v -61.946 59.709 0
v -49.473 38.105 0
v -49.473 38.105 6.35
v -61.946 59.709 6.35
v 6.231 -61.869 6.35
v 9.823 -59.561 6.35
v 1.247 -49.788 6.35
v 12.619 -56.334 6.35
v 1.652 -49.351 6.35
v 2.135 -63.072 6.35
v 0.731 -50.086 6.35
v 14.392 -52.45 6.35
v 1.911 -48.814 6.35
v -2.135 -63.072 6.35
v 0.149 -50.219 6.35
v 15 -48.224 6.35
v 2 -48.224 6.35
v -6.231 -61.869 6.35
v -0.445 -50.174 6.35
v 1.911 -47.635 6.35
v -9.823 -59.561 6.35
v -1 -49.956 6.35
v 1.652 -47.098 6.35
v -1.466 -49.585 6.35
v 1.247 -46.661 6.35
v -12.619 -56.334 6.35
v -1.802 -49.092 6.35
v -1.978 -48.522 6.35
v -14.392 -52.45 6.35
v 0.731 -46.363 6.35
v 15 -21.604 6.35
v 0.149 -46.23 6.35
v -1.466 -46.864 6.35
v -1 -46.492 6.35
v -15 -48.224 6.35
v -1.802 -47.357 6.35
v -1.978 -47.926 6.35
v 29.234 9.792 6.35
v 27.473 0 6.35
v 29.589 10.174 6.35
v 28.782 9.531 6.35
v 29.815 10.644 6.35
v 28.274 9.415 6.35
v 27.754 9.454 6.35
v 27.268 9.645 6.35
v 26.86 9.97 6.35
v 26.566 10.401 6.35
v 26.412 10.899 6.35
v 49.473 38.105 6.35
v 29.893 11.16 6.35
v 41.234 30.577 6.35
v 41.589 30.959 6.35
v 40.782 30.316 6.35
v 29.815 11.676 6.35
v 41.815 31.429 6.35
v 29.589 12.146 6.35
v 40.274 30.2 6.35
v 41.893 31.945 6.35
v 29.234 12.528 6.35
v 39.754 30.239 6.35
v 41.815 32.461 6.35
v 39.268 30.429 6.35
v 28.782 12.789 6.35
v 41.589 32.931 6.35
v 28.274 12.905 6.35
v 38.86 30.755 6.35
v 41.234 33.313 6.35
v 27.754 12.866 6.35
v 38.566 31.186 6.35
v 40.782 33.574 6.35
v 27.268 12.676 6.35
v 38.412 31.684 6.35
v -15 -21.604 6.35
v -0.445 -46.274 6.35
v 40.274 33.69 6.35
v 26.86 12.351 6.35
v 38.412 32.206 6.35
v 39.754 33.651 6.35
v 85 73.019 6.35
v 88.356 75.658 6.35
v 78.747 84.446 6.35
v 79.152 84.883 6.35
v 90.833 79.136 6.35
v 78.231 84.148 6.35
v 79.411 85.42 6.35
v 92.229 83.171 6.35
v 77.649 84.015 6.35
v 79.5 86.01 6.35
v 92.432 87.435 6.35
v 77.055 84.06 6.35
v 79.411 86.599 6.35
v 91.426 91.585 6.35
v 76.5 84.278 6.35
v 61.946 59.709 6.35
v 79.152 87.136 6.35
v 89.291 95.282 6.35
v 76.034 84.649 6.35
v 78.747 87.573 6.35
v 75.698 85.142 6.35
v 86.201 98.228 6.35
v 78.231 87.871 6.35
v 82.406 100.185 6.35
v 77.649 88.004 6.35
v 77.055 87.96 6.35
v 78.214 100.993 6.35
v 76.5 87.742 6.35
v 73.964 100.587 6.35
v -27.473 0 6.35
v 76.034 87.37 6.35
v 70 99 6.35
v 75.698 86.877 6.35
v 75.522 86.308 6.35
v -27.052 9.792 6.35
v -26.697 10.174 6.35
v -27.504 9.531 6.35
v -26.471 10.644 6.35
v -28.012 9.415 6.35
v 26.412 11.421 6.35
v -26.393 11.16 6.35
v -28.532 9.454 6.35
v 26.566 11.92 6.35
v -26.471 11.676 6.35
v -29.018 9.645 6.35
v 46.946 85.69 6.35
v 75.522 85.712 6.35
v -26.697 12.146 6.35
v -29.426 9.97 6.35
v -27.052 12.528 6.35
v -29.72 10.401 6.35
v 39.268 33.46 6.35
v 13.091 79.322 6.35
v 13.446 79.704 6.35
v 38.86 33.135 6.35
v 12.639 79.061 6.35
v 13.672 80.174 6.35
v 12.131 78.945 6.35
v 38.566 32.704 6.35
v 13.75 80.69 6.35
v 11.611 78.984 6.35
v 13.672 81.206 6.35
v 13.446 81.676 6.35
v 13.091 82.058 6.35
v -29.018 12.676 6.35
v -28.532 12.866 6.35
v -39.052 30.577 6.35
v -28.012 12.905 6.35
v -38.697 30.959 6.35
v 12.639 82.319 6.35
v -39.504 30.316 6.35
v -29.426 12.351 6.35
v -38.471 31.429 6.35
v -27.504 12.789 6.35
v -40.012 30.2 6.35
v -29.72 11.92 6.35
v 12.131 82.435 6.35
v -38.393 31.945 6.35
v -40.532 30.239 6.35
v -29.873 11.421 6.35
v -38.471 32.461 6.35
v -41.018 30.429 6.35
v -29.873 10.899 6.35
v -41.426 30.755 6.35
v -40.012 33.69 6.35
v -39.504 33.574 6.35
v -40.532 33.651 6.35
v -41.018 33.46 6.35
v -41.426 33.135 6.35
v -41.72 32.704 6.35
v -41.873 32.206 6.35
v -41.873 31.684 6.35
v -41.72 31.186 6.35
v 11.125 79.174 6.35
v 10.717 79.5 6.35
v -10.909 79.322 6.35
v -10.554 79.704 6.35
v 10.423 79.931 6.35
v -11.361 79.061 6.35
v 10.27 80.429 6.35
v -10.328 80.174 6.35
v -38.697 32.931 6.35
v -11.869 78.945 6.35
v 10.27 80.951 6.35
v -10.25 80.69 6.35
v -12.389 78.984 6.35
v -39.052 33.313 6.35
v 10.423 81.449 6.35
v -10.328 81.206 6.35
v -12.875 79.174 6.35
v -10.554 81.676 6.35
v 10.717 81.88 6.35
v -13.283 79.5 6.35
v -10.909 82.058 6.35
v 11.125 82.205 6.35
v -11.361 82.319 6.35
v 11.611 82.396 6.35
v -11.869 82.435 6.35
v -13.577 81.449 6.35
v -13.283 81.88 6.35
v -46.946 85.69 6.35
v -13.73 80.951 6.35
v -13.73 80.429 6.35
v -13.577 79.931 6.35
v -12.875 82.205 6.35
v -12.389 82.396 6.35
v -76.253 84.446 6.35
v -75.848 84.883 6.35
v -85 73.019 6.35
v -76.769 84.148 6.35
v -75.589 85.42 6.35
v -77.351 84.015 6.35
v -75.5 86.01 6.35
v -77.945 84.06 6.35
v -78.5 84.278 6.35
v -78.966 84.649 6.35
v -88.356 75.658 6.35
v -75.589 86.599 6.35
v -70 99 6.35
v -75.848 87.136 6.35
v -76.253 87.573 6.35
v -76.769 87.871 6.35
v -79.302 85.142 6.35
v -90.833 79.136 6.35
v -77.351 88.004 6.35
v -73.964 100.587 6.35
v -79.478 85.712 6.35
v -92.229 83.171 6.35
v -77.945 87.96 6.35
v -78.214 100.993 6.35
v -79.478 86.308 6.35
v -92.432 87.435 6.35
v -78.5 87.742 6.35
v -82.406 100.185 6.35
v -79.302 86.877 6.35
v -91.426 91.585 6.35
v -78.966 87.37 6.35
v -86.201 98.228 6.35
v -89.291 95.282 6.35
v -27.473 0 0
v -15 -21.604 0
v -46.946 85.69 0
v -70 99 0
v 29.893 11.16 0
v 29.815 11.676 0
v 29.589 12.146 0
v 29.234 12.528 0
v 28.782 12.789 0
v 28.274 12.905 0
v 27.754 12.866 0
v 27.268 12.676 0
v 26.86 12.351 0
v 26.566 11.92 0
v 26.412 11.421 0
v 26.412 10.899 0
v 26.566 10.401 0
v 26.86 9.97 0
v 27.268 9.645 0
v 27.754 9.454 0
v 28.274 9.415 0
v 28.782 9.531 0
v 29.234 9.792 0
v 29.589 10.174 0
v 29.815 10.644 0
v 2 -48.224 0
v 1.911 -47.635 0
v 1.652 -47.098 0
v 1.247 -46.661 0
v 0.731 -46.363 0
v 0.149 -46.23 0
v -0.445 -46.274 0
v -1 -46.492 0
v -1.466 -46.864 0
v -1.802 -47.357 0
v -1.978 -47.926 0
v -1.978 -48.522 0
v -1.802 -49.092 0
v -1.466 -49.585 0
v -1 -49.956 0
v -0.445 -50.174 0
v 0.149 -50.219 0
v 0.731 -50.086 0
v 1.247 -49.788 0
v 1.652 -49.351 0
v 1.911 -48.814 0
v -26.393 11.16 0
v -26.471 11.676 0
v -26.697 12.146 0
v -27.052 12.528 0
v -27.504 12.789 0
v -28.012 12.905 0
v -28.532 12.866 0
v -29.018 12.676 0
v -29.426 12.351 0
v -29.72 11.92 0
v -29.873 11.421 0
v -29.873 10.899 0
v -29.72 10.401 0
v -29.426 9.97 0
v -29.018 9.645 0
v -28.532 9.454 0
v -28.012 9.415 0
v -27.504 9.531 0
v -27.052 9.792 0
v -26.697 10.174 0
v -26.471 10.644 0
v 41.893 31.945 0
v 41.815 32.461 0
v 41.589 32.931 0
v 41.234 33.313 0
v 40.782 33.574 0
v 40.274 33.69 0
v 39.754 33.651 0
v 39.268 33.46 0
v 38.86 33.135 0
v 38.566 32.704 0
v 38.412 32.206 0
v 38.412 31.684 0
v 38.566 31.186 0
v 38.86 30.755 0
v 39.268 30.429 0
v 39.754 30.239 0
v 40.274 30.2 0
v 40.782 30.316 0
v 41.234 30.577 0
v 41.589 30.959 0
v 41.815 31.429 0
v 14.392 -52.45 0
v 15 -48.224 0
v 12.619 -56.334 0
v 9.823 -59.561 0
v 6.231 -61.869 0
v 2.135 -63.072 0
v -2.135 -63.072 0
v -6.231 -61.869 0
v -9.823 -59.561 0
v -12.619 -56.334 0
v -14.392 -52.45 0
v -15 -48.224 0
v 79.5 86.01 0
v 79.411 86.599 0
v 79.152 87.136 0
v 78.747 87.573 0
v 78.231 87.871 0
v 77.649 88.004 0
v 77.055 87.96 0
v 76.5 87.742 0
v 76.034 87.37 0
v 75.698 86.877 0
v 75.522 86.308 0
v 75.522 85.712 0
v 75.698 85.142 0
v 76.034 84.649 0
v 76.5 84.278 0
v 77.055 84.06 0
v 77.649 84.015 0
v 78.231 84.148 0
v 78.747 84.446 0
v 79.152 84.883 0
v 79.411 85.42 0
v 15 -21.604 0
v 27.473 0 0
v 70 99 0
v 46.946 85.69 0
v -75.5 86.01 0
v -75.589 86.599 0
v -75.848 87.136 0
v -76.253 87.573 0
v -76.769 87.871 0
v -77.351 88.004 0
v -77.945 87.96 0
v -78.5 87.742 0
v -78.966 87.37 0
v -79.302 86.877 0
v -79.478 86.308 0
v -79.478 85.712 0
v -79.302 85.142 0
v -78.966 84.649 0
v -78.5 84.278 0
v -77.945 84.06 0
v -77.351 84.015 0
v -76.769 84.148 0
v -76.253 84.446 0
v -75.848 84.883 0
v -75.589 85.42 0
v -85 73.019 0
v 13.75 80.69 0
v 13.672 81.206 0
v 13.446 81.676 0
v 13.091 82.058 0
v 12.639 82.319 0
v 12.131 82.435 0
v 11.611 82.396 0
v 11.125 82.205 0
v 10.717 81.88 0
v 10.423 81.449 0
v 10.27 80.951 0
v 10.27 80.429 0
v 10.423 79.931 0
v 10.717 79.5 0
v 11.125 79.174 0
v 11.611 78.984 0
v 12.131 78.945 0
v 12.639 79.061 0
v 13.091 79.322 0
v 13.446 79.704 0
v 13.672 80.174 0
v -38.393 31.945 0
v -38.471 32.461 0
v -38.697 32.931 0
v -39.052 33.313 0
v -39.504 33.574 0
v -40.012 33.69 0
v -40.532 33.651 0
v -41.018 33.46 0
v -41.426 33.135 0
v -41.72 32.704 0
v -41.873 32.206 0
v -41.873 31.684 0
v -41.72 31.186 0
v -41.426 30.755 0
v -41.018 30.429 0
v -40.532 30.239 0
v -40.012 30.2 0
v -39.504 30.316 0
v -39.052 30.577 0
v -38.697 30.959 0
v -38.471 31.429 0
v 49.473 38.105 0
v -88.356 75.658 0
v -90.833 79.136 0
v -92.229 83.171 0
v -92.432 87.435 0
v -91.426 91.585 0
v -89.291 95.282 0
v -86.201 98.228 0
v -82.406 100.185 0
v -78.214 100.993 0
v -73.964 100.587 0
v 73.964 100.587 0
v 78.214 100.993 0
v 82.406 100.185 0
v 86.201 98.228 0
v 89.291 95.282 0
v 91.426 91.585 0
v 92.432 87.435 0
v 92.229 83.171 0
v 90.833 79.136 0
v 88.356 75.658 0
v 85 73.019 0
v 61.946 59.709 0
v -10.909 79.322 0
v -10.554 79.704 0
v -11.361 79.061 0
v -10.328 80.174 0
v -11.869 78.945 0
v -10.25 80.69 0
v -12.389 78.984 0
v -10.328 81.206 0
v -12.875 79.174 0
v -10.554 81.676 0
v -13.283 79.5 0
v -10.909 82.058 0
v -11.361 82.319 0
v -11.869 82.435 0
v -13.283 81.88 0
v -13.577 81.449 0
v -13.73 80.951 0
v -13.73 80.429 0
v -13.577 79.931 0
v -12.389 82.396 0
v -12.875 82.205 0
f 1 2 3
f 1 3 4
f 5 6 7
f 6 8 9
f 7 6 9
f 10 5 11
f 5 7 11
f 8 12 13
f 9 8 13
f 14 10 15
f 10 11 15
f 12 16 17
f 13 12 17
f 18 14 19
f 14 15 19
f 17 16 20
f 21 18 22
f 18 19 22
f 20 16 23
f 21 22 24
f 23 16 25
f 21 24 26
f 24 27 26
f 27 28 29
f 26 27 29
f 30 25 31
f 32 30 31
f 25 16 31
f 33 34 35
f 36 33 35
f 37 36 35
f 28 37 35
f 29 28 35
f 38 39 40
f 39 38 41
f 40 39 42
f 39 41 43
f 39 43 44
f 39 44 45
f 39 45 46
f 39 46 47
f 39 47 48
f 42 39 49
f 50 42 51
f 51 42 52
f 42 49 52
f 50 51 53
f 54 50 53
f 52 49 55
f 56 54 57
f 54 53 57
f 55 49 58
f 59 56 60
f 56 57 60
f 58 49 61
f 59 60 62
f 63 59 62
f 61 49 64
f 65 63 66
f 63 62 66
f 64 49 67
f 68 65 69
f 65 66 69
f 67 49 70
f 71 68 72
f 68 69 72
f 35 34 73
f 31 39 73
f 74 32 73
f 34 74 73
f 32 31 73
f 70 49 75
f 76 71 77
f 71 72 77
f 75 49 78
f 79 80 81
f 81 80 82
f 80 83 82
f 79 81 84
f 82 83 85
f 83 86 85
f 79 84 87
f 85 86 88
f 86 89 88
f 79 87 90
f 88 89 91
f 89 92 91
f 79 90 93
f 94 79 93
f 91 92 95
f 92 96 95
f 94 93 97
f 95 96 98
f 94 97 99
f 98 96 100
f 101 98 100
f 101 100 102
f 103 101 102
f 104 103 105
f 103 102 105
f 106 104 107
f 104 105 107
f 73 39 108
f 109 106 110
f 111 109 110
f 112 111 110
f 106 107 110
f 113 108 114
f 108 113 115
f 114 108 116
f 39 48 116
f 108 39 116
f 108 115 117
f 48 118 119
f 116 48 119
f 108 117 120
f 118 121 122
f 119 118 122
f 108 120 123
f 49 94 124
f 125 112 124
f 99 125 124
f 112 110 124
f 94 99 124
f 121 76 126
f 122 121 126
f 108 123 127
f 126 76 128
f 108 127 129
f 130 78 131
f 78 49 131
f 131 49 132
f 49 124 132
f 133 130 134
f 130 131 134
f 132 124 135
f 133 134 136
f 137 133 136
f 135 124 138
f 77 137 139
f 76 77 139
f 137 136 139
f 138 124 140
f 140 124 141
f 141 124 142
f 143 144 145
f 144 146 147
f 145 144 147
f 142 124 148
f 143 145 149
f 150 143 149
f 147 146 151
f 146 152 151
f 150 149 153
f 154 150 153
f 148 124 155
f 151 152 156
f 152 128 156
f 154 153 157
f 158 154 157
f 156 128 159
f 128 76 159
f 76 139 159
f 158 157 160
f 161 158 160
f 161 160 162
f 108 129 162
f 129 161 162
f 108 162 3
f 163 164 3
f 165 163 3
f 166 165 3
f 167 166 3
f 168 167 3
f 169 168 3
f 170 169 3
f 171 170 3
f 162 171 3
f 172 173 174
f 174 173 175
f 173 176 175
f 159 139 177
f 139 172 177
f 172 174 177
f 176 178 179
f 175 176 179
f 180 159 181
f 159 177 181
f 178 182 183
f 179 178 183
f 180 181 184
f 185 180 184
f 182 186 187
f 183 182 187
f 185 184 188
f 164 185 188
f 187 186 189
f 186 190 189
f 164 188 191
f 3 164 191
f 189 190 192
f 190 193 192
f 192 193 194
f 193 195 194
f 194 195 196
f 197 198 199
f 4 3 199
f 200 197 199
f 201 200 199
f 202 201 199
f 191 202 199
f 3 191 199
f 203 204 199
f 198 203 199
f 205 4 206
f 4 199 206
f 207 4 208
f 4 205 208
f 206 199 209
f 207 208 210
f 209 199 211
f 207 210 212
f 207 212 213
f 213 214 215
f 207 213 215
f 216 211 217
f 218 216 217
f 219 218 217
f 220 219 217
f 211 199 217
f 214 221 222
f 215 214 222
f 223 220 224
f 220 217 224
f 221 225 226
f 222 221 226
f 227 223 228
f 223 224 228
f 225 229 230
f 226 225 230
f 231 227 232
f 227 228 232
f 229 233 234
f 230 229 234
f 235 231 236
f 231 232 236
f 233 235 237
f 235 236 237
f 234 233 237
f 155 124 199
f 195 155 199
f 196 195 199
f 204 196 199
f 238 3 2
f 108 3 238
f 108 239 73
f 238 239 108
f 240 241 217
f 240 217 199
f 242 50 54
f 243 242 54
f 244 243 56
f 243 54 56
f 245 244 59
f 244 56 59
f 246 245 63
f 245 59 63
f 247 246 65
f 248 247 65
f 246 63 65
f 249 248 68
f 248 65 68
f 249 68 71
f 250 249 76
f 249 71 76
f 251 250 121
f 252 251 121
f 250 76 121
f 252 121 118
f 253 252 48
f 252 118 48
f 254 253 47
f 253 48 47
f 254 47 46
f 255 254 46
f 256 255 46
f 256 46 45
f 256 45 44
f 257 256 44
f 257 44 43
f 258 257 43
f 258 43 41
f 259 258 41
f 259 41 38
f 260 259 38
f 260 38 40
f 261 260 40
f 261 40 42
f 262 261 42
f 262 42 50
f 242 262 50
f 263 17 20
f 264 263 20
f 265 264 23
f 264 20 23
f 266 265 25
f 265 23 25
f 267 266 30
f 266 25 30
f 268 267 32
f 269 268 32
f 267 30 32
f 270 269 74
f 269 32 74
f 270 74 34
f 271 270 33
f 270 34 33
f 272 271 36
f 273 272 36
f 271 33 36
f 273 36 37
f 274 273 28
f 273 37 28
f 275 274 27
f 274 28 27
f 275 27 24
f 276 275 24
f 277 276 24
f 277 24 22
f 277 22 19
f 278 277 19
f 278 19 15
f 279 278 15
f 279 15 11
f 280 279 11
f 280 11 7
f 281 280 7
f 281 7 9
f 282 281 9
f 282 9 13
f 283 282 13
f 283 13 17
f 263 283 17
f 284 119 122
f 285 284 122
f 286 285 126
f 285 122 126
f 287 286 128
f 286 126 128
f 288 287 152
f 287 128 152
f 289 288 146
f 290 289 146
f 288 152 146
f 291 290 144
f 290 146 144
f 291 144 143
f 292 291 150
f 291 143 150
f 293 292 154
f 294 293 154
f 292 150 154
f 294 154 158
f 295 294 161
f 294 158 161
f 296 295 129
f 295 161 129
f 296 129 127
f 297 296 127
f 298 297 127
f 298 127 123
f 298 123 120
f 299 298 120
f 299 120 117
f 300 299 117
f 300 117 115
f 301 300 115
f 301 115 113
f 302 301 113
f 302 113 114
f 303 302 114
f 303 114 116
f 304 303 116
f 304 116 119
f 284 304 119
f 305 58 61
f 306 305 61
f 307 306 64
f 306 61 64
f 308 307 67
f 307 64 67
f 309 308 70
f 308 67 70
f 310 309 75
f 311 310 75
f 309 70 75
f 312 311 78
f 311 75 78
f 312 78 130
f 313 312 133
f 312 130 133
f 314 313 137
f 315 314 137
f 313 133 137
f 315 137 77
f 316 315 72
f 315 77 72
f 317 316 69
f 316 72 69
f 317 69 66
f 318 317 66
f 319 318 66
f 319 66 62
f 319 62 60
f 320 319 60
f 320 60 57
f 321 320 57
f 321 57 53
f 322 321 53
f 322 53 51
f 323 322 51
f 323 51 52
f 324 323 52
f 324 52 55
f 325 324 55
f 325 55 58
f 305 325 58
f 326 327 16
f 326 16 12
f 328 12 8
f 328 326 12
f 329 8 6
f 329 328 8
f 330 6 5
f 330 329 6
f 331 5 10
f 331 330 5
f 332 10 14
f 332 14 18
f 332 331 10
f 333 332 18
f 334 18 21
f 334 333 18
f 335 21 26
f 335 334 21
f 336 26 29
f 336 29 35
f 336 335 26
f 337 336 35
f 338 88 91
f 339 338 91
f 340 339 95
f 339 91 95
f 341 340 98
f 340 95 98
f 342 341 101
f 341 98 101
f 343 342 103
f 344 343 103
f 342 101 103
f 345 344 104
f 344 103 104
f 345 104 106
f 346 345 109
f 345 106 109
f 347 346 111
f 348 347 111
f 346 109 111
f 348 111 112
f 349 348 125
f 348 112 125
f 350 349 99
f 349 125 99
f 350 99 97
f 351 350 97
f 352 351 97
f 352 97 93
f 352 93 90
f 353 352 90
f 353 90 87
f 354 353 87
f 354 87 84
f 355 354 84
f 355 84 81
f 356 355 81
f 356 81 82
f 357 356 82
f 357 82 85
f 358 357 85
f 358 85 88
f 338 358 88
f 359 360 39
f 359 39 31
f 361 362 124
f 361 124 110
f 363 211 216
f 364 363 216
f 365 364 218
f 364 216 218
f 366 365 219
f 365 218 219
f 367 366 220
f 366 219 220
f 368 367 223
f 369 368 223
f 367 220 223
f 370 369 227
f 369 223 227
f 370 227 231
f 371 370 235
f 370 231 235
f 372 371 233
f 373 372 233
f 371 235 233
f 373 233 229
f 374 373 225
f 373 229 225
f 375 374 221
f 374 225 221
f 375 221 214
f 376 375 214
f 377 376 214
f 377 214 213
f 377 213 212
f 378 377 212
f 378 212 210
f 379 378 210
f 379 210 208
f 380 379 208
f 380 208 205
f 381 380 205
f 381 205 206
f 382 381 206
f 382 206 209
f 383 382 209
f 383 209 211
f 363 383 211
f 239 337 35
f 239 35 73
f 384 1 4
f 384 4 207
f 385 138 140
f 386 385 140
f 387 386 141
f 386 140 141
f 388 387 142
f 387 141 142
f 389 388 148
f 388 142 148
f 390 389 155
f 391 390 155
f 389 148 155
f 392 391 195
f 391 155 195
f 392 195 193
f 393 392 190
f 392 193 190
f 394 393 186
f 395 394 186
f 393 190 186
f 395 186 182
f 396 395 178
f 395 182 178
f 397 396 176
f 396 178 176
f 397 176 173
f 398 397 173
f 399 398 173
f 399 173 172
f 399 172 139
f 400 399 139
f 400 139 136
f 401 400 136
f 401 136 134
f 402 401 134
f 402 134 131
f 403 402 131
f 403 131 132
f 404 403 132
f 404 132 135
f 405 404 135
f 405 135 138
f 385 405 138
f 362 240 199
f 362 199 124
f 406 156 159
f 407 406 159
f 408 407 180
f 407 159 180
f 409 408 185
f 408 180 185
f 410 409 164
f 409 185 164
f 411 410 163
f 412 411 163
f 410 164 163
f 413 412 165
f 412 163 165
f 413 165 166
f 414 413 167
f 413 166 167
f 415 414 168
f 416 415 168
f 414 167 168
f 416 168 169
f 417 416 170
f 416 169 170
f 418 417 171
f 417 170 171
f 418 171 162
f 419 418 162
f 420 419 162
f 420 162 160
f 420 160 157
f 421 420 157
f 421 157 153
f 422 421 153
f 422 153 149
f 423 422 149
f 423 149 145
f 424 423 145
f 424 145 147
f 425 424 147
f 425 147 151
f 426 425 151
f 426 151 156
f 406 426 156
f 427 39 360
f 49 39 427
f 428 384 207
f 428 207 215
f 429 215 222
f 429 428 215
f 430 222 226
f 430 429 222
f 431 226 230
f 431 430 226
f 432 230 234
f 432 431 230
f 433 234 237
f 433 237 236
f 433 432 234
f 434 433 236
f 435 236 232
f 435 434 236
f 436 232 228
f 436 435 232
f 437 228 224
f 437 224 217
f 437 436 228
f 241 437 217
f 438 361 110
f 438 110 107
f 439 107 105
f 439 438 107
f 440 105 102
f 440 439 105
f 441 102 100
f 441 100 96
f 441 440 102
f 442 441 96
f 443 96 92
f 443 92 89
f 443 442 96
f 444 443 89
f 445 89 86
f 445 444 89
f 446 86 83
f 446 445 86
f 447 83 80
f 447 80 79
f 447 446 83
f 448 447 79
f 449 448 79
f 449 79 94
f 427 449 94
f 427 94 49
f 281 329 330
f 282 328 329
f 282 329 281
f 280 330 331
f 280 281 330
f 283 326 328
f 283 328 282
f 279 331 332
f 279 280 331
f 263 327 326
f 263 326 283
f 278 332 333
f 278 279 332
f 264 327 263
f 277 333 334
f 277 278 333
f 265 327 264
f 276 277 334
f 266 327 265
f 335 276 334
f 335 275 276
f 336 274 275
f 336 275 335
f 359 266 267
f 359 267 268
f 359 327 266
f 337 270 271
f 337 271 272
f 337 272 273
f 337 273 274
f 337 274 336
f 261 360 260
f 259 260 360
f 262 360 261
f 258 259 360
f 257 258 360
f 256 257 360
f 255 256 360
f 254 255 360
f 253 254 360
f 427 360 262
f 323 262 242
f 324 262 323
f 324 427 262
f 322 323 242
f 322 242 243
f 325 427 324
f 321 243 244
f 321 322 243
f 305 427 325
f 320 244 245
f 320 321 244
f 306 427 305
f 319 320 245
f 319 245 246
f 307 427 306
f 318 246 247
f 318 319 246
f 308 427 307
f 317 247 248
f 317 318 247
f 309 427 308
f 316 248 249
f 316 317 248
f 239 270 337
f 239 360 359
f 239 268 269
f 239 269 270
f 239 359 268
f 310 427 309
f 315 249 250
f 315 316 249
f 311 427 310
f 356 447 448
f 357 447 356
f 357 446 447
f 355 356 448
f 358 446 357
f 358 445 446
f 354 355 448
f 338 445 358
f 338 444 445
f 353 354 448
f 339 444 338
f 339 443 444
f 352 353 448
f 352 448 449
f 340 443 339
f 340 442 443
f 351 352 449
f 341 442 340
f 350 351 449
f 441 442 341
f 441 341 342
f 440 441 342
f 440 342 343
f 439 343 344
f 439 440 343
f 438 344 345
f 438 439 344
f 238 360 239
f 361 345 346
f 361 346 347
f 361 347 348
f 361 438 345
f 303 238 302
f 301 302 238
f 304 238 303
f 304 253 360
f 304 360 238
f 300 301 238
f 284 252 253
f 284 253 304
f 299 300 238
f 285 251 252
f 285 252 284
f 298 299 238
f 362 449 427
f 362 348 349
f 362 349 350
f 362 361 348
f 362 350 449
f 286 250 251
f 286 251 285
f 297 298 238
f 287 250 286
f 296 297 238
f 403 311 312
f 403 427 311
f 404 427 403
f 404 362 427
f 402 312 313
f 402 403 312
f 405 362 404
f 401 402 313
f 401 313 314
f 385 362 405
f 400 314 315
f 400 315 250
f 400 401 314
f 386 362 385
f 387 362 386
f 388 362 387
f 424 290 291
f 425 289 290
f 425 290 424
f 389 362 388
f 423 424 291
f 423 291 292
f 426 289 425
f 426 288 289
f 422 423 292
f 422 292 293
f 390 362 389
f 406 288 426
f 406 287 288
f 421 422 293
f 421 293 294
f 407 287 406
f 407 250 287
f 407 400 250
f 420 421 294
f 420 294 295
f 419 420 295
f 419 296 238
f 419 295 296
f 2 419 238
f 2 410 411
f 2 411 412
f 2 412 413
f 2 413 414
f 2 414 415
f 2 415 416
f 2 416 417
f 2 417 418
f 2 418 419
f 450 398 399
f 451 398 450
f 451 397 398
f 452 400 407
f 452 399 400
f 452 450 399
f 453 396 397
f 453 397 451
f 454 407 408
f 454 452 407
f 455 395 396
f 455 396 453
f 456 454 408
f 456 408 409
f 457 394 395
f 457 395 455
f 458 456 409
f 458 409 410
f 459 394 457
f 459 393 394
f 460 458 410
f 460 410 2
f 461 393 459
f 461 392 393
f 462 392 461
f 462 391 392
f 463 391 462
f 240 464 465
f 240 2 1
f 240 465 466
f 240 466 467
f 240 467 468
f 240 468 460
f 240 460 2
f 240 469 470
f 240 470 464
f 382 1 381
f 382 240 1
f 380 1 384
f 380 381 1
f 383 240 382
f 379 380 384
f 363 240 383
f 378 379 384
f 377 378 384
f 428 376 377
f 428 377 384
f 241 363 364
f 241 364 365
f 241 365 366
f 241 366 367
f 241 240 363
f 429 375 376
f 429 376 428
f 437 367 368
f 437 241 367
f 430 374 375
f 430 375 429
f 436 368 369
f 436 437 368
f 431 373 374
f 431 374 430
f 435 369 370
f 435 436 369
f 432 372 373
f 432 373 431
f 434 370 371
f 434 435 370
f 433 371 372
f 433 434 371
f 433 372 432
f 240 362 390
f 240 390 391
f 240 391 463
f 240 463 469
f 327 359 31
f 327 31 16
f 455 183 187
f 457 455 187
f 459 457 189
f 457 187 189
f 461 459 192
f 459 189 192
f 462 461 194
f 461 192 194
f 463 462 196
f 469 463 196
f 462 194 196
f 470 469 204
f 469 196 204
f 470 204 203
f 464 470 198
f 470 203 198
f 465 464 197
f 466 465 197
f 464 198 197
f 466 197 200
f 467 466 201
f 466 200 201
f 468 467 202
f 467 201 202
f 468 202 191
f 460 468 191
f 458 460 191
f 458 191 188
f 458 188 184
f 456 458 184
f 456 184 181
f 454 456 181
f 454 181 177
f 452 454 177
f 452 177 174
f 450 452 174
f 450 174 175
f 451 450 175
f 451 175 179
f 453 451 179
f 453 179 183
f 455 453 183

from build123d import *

# Parameters (mm, degrees)
BOSS_EXTRU_1_DEPTH      = 6.35
ENL_V_MAT_EXTRU_2_DEPTH = 144.087124508
ESQUISSE5_R             = 1.75
ENL_V_MAT_EXTRU_3_DEPTH = 100.149703595
BOSS_EXTRU_2_DEPTH      = 6.35
ESQUISSE11_R            = 2
ENL_V_MAT_EXTRU_4_DEPTH = 138.111345481


with BuildPart() as part:
    # Esquisse2 → Boss.-Extru.1 (new body)
    with BuildSketch(Plane.XY):
        Polygon((-71.473076574, 0), (71.473076574, 0), (0, 123.795), align=None)
    extrude(amount=BOSS_EXTRU_1_DEPTH)

    # Esquisse4 → Enlèv. mat.-Extru.2 (cut, through all)
    with BuildSketch(Plane.XY.offset(6.35)):
        Polygon((-71.473076574, 0), (-49.473076574, 38.105117767), (-27.473076574, 0), align=None)
        Polygon((71.473076574, 0), (27.473076574, 0), (49.473076574, 38.105117767), align=None)
        Polygon((0, 123.795), (-22, 85.689882233), (22, 85.689882233), align=None)
    extrude(amount=-ENL_V_MAT_EXTRU_2_DEPTH, mode=Mode.SUBTRACT)

    # Esquisse5 → Enlèv. mat.-Extru.3 (cut, through all)
    with BuildSketch(Plane.XY.offset(6.35)):
        with Locations((-40.142949555, 31.944863729)):
            Circle(ESQUISSE5_R)
        with Locations((-28.142949555, 11.160254038)):
            Circle(ESQUISSE5_R)
        with Locations((28.142949555, 11.160254038)):
            Circle(ESQUISSE5_R)
        with Locations((40.142949555, 31.944863729)):
            Circle(ESQUISSE5_R)
        with Locations((-12, 80.689882233)):
            Circle(ESQUISSE5_R)
        with Locations((12, 80.689882233)):
            Circle(ESQUISSE5_R)
    extrude(amount=-ENL_V_MAT_EXTRU_3_DEPTH, mode=Mode.SUBTRACT)

    # Esquisse10 → Boss.-Extru.2 (add)
    with BuildSketch(Plane(origin=(0, 0, 0), x_dir=(-1, 0, 0), z_dir=(0, 0, -1))):
        with BuildLine():
            Line((49.473076574, 38.105117767), (61.946156702, 59.709120804))
            Line((61.946156702, 59.709120804), (85.000000578, 73.019265173))
            ThreePointArc((85.000000578, 73.019265173), (90.4903807, 93.50964648), (69.999999393, 99.000026602))
            Line((69.999999393, 99.000026602), (46.946155518, 85.689882233))
            Line((46.946155518, 85.689882233), (22, 85.689882233))
            Line((22, 85.689882233), (49.473076574, 38.105117767))
        make_face()
        with BuildLine():
            Line((-22, 85.689882233), (-46.946155518, 85.689882233))
            Line((-46.946155518, 85.689882233), (-69.999999408, 99.000026577))
            ThreePointArc((-69.999999408, 99.000026577), (-90.490381043, 93.509645854), (-84.999999408, 73.019264463))
            Line((-84.999999408, 73.019264463), (-61.946154333, 59.709122172))
            Line((-61.946154333, 59.709122172), (-49.473076574, 38.105117767))
            Line((-49.473076574, 38.105117767), (-22, 85.689882233))
        make_face()
        with BuildLine():
            Line((-27.473076574, 0), (-15, -21.604005089))
            Line((-15, -21.604005089), (-15, -48.224291724))
            ThreePointArc((-15, -48.224291724), (0, -63.224291724), (15, -48.224291724))
            Line((15, -48.224291724), (15, -21.604005089))
            Line((15, -21.604005089), (27.473076574, 0))
            Line((27.473076574, 0), (-27.473076574, 0))
        make_face()
    extrude(amount=-BOSS_EXTRU_2_DEPTH)

    # Esquisse11 → Enlèv. mat.-Extru.4 (cut, through all)
    with BuildSketch(Plane.XY.offset(6.35)):
        with Locations((-77.5, 86.009645862)):
            Circle(ESQUISSE11_R)
        with Locations((77.5, 86.009645862)):
            Circle(ESQUISSE11_R)
        with Locations((0, -48.224291724)):
            Circle(ESQUISSE11_R)
    extrude(amount=-ENL_V_MAT_EXTRU_4_DEPTH, mode=Mode.SUBTRACT)


solid = part.part
